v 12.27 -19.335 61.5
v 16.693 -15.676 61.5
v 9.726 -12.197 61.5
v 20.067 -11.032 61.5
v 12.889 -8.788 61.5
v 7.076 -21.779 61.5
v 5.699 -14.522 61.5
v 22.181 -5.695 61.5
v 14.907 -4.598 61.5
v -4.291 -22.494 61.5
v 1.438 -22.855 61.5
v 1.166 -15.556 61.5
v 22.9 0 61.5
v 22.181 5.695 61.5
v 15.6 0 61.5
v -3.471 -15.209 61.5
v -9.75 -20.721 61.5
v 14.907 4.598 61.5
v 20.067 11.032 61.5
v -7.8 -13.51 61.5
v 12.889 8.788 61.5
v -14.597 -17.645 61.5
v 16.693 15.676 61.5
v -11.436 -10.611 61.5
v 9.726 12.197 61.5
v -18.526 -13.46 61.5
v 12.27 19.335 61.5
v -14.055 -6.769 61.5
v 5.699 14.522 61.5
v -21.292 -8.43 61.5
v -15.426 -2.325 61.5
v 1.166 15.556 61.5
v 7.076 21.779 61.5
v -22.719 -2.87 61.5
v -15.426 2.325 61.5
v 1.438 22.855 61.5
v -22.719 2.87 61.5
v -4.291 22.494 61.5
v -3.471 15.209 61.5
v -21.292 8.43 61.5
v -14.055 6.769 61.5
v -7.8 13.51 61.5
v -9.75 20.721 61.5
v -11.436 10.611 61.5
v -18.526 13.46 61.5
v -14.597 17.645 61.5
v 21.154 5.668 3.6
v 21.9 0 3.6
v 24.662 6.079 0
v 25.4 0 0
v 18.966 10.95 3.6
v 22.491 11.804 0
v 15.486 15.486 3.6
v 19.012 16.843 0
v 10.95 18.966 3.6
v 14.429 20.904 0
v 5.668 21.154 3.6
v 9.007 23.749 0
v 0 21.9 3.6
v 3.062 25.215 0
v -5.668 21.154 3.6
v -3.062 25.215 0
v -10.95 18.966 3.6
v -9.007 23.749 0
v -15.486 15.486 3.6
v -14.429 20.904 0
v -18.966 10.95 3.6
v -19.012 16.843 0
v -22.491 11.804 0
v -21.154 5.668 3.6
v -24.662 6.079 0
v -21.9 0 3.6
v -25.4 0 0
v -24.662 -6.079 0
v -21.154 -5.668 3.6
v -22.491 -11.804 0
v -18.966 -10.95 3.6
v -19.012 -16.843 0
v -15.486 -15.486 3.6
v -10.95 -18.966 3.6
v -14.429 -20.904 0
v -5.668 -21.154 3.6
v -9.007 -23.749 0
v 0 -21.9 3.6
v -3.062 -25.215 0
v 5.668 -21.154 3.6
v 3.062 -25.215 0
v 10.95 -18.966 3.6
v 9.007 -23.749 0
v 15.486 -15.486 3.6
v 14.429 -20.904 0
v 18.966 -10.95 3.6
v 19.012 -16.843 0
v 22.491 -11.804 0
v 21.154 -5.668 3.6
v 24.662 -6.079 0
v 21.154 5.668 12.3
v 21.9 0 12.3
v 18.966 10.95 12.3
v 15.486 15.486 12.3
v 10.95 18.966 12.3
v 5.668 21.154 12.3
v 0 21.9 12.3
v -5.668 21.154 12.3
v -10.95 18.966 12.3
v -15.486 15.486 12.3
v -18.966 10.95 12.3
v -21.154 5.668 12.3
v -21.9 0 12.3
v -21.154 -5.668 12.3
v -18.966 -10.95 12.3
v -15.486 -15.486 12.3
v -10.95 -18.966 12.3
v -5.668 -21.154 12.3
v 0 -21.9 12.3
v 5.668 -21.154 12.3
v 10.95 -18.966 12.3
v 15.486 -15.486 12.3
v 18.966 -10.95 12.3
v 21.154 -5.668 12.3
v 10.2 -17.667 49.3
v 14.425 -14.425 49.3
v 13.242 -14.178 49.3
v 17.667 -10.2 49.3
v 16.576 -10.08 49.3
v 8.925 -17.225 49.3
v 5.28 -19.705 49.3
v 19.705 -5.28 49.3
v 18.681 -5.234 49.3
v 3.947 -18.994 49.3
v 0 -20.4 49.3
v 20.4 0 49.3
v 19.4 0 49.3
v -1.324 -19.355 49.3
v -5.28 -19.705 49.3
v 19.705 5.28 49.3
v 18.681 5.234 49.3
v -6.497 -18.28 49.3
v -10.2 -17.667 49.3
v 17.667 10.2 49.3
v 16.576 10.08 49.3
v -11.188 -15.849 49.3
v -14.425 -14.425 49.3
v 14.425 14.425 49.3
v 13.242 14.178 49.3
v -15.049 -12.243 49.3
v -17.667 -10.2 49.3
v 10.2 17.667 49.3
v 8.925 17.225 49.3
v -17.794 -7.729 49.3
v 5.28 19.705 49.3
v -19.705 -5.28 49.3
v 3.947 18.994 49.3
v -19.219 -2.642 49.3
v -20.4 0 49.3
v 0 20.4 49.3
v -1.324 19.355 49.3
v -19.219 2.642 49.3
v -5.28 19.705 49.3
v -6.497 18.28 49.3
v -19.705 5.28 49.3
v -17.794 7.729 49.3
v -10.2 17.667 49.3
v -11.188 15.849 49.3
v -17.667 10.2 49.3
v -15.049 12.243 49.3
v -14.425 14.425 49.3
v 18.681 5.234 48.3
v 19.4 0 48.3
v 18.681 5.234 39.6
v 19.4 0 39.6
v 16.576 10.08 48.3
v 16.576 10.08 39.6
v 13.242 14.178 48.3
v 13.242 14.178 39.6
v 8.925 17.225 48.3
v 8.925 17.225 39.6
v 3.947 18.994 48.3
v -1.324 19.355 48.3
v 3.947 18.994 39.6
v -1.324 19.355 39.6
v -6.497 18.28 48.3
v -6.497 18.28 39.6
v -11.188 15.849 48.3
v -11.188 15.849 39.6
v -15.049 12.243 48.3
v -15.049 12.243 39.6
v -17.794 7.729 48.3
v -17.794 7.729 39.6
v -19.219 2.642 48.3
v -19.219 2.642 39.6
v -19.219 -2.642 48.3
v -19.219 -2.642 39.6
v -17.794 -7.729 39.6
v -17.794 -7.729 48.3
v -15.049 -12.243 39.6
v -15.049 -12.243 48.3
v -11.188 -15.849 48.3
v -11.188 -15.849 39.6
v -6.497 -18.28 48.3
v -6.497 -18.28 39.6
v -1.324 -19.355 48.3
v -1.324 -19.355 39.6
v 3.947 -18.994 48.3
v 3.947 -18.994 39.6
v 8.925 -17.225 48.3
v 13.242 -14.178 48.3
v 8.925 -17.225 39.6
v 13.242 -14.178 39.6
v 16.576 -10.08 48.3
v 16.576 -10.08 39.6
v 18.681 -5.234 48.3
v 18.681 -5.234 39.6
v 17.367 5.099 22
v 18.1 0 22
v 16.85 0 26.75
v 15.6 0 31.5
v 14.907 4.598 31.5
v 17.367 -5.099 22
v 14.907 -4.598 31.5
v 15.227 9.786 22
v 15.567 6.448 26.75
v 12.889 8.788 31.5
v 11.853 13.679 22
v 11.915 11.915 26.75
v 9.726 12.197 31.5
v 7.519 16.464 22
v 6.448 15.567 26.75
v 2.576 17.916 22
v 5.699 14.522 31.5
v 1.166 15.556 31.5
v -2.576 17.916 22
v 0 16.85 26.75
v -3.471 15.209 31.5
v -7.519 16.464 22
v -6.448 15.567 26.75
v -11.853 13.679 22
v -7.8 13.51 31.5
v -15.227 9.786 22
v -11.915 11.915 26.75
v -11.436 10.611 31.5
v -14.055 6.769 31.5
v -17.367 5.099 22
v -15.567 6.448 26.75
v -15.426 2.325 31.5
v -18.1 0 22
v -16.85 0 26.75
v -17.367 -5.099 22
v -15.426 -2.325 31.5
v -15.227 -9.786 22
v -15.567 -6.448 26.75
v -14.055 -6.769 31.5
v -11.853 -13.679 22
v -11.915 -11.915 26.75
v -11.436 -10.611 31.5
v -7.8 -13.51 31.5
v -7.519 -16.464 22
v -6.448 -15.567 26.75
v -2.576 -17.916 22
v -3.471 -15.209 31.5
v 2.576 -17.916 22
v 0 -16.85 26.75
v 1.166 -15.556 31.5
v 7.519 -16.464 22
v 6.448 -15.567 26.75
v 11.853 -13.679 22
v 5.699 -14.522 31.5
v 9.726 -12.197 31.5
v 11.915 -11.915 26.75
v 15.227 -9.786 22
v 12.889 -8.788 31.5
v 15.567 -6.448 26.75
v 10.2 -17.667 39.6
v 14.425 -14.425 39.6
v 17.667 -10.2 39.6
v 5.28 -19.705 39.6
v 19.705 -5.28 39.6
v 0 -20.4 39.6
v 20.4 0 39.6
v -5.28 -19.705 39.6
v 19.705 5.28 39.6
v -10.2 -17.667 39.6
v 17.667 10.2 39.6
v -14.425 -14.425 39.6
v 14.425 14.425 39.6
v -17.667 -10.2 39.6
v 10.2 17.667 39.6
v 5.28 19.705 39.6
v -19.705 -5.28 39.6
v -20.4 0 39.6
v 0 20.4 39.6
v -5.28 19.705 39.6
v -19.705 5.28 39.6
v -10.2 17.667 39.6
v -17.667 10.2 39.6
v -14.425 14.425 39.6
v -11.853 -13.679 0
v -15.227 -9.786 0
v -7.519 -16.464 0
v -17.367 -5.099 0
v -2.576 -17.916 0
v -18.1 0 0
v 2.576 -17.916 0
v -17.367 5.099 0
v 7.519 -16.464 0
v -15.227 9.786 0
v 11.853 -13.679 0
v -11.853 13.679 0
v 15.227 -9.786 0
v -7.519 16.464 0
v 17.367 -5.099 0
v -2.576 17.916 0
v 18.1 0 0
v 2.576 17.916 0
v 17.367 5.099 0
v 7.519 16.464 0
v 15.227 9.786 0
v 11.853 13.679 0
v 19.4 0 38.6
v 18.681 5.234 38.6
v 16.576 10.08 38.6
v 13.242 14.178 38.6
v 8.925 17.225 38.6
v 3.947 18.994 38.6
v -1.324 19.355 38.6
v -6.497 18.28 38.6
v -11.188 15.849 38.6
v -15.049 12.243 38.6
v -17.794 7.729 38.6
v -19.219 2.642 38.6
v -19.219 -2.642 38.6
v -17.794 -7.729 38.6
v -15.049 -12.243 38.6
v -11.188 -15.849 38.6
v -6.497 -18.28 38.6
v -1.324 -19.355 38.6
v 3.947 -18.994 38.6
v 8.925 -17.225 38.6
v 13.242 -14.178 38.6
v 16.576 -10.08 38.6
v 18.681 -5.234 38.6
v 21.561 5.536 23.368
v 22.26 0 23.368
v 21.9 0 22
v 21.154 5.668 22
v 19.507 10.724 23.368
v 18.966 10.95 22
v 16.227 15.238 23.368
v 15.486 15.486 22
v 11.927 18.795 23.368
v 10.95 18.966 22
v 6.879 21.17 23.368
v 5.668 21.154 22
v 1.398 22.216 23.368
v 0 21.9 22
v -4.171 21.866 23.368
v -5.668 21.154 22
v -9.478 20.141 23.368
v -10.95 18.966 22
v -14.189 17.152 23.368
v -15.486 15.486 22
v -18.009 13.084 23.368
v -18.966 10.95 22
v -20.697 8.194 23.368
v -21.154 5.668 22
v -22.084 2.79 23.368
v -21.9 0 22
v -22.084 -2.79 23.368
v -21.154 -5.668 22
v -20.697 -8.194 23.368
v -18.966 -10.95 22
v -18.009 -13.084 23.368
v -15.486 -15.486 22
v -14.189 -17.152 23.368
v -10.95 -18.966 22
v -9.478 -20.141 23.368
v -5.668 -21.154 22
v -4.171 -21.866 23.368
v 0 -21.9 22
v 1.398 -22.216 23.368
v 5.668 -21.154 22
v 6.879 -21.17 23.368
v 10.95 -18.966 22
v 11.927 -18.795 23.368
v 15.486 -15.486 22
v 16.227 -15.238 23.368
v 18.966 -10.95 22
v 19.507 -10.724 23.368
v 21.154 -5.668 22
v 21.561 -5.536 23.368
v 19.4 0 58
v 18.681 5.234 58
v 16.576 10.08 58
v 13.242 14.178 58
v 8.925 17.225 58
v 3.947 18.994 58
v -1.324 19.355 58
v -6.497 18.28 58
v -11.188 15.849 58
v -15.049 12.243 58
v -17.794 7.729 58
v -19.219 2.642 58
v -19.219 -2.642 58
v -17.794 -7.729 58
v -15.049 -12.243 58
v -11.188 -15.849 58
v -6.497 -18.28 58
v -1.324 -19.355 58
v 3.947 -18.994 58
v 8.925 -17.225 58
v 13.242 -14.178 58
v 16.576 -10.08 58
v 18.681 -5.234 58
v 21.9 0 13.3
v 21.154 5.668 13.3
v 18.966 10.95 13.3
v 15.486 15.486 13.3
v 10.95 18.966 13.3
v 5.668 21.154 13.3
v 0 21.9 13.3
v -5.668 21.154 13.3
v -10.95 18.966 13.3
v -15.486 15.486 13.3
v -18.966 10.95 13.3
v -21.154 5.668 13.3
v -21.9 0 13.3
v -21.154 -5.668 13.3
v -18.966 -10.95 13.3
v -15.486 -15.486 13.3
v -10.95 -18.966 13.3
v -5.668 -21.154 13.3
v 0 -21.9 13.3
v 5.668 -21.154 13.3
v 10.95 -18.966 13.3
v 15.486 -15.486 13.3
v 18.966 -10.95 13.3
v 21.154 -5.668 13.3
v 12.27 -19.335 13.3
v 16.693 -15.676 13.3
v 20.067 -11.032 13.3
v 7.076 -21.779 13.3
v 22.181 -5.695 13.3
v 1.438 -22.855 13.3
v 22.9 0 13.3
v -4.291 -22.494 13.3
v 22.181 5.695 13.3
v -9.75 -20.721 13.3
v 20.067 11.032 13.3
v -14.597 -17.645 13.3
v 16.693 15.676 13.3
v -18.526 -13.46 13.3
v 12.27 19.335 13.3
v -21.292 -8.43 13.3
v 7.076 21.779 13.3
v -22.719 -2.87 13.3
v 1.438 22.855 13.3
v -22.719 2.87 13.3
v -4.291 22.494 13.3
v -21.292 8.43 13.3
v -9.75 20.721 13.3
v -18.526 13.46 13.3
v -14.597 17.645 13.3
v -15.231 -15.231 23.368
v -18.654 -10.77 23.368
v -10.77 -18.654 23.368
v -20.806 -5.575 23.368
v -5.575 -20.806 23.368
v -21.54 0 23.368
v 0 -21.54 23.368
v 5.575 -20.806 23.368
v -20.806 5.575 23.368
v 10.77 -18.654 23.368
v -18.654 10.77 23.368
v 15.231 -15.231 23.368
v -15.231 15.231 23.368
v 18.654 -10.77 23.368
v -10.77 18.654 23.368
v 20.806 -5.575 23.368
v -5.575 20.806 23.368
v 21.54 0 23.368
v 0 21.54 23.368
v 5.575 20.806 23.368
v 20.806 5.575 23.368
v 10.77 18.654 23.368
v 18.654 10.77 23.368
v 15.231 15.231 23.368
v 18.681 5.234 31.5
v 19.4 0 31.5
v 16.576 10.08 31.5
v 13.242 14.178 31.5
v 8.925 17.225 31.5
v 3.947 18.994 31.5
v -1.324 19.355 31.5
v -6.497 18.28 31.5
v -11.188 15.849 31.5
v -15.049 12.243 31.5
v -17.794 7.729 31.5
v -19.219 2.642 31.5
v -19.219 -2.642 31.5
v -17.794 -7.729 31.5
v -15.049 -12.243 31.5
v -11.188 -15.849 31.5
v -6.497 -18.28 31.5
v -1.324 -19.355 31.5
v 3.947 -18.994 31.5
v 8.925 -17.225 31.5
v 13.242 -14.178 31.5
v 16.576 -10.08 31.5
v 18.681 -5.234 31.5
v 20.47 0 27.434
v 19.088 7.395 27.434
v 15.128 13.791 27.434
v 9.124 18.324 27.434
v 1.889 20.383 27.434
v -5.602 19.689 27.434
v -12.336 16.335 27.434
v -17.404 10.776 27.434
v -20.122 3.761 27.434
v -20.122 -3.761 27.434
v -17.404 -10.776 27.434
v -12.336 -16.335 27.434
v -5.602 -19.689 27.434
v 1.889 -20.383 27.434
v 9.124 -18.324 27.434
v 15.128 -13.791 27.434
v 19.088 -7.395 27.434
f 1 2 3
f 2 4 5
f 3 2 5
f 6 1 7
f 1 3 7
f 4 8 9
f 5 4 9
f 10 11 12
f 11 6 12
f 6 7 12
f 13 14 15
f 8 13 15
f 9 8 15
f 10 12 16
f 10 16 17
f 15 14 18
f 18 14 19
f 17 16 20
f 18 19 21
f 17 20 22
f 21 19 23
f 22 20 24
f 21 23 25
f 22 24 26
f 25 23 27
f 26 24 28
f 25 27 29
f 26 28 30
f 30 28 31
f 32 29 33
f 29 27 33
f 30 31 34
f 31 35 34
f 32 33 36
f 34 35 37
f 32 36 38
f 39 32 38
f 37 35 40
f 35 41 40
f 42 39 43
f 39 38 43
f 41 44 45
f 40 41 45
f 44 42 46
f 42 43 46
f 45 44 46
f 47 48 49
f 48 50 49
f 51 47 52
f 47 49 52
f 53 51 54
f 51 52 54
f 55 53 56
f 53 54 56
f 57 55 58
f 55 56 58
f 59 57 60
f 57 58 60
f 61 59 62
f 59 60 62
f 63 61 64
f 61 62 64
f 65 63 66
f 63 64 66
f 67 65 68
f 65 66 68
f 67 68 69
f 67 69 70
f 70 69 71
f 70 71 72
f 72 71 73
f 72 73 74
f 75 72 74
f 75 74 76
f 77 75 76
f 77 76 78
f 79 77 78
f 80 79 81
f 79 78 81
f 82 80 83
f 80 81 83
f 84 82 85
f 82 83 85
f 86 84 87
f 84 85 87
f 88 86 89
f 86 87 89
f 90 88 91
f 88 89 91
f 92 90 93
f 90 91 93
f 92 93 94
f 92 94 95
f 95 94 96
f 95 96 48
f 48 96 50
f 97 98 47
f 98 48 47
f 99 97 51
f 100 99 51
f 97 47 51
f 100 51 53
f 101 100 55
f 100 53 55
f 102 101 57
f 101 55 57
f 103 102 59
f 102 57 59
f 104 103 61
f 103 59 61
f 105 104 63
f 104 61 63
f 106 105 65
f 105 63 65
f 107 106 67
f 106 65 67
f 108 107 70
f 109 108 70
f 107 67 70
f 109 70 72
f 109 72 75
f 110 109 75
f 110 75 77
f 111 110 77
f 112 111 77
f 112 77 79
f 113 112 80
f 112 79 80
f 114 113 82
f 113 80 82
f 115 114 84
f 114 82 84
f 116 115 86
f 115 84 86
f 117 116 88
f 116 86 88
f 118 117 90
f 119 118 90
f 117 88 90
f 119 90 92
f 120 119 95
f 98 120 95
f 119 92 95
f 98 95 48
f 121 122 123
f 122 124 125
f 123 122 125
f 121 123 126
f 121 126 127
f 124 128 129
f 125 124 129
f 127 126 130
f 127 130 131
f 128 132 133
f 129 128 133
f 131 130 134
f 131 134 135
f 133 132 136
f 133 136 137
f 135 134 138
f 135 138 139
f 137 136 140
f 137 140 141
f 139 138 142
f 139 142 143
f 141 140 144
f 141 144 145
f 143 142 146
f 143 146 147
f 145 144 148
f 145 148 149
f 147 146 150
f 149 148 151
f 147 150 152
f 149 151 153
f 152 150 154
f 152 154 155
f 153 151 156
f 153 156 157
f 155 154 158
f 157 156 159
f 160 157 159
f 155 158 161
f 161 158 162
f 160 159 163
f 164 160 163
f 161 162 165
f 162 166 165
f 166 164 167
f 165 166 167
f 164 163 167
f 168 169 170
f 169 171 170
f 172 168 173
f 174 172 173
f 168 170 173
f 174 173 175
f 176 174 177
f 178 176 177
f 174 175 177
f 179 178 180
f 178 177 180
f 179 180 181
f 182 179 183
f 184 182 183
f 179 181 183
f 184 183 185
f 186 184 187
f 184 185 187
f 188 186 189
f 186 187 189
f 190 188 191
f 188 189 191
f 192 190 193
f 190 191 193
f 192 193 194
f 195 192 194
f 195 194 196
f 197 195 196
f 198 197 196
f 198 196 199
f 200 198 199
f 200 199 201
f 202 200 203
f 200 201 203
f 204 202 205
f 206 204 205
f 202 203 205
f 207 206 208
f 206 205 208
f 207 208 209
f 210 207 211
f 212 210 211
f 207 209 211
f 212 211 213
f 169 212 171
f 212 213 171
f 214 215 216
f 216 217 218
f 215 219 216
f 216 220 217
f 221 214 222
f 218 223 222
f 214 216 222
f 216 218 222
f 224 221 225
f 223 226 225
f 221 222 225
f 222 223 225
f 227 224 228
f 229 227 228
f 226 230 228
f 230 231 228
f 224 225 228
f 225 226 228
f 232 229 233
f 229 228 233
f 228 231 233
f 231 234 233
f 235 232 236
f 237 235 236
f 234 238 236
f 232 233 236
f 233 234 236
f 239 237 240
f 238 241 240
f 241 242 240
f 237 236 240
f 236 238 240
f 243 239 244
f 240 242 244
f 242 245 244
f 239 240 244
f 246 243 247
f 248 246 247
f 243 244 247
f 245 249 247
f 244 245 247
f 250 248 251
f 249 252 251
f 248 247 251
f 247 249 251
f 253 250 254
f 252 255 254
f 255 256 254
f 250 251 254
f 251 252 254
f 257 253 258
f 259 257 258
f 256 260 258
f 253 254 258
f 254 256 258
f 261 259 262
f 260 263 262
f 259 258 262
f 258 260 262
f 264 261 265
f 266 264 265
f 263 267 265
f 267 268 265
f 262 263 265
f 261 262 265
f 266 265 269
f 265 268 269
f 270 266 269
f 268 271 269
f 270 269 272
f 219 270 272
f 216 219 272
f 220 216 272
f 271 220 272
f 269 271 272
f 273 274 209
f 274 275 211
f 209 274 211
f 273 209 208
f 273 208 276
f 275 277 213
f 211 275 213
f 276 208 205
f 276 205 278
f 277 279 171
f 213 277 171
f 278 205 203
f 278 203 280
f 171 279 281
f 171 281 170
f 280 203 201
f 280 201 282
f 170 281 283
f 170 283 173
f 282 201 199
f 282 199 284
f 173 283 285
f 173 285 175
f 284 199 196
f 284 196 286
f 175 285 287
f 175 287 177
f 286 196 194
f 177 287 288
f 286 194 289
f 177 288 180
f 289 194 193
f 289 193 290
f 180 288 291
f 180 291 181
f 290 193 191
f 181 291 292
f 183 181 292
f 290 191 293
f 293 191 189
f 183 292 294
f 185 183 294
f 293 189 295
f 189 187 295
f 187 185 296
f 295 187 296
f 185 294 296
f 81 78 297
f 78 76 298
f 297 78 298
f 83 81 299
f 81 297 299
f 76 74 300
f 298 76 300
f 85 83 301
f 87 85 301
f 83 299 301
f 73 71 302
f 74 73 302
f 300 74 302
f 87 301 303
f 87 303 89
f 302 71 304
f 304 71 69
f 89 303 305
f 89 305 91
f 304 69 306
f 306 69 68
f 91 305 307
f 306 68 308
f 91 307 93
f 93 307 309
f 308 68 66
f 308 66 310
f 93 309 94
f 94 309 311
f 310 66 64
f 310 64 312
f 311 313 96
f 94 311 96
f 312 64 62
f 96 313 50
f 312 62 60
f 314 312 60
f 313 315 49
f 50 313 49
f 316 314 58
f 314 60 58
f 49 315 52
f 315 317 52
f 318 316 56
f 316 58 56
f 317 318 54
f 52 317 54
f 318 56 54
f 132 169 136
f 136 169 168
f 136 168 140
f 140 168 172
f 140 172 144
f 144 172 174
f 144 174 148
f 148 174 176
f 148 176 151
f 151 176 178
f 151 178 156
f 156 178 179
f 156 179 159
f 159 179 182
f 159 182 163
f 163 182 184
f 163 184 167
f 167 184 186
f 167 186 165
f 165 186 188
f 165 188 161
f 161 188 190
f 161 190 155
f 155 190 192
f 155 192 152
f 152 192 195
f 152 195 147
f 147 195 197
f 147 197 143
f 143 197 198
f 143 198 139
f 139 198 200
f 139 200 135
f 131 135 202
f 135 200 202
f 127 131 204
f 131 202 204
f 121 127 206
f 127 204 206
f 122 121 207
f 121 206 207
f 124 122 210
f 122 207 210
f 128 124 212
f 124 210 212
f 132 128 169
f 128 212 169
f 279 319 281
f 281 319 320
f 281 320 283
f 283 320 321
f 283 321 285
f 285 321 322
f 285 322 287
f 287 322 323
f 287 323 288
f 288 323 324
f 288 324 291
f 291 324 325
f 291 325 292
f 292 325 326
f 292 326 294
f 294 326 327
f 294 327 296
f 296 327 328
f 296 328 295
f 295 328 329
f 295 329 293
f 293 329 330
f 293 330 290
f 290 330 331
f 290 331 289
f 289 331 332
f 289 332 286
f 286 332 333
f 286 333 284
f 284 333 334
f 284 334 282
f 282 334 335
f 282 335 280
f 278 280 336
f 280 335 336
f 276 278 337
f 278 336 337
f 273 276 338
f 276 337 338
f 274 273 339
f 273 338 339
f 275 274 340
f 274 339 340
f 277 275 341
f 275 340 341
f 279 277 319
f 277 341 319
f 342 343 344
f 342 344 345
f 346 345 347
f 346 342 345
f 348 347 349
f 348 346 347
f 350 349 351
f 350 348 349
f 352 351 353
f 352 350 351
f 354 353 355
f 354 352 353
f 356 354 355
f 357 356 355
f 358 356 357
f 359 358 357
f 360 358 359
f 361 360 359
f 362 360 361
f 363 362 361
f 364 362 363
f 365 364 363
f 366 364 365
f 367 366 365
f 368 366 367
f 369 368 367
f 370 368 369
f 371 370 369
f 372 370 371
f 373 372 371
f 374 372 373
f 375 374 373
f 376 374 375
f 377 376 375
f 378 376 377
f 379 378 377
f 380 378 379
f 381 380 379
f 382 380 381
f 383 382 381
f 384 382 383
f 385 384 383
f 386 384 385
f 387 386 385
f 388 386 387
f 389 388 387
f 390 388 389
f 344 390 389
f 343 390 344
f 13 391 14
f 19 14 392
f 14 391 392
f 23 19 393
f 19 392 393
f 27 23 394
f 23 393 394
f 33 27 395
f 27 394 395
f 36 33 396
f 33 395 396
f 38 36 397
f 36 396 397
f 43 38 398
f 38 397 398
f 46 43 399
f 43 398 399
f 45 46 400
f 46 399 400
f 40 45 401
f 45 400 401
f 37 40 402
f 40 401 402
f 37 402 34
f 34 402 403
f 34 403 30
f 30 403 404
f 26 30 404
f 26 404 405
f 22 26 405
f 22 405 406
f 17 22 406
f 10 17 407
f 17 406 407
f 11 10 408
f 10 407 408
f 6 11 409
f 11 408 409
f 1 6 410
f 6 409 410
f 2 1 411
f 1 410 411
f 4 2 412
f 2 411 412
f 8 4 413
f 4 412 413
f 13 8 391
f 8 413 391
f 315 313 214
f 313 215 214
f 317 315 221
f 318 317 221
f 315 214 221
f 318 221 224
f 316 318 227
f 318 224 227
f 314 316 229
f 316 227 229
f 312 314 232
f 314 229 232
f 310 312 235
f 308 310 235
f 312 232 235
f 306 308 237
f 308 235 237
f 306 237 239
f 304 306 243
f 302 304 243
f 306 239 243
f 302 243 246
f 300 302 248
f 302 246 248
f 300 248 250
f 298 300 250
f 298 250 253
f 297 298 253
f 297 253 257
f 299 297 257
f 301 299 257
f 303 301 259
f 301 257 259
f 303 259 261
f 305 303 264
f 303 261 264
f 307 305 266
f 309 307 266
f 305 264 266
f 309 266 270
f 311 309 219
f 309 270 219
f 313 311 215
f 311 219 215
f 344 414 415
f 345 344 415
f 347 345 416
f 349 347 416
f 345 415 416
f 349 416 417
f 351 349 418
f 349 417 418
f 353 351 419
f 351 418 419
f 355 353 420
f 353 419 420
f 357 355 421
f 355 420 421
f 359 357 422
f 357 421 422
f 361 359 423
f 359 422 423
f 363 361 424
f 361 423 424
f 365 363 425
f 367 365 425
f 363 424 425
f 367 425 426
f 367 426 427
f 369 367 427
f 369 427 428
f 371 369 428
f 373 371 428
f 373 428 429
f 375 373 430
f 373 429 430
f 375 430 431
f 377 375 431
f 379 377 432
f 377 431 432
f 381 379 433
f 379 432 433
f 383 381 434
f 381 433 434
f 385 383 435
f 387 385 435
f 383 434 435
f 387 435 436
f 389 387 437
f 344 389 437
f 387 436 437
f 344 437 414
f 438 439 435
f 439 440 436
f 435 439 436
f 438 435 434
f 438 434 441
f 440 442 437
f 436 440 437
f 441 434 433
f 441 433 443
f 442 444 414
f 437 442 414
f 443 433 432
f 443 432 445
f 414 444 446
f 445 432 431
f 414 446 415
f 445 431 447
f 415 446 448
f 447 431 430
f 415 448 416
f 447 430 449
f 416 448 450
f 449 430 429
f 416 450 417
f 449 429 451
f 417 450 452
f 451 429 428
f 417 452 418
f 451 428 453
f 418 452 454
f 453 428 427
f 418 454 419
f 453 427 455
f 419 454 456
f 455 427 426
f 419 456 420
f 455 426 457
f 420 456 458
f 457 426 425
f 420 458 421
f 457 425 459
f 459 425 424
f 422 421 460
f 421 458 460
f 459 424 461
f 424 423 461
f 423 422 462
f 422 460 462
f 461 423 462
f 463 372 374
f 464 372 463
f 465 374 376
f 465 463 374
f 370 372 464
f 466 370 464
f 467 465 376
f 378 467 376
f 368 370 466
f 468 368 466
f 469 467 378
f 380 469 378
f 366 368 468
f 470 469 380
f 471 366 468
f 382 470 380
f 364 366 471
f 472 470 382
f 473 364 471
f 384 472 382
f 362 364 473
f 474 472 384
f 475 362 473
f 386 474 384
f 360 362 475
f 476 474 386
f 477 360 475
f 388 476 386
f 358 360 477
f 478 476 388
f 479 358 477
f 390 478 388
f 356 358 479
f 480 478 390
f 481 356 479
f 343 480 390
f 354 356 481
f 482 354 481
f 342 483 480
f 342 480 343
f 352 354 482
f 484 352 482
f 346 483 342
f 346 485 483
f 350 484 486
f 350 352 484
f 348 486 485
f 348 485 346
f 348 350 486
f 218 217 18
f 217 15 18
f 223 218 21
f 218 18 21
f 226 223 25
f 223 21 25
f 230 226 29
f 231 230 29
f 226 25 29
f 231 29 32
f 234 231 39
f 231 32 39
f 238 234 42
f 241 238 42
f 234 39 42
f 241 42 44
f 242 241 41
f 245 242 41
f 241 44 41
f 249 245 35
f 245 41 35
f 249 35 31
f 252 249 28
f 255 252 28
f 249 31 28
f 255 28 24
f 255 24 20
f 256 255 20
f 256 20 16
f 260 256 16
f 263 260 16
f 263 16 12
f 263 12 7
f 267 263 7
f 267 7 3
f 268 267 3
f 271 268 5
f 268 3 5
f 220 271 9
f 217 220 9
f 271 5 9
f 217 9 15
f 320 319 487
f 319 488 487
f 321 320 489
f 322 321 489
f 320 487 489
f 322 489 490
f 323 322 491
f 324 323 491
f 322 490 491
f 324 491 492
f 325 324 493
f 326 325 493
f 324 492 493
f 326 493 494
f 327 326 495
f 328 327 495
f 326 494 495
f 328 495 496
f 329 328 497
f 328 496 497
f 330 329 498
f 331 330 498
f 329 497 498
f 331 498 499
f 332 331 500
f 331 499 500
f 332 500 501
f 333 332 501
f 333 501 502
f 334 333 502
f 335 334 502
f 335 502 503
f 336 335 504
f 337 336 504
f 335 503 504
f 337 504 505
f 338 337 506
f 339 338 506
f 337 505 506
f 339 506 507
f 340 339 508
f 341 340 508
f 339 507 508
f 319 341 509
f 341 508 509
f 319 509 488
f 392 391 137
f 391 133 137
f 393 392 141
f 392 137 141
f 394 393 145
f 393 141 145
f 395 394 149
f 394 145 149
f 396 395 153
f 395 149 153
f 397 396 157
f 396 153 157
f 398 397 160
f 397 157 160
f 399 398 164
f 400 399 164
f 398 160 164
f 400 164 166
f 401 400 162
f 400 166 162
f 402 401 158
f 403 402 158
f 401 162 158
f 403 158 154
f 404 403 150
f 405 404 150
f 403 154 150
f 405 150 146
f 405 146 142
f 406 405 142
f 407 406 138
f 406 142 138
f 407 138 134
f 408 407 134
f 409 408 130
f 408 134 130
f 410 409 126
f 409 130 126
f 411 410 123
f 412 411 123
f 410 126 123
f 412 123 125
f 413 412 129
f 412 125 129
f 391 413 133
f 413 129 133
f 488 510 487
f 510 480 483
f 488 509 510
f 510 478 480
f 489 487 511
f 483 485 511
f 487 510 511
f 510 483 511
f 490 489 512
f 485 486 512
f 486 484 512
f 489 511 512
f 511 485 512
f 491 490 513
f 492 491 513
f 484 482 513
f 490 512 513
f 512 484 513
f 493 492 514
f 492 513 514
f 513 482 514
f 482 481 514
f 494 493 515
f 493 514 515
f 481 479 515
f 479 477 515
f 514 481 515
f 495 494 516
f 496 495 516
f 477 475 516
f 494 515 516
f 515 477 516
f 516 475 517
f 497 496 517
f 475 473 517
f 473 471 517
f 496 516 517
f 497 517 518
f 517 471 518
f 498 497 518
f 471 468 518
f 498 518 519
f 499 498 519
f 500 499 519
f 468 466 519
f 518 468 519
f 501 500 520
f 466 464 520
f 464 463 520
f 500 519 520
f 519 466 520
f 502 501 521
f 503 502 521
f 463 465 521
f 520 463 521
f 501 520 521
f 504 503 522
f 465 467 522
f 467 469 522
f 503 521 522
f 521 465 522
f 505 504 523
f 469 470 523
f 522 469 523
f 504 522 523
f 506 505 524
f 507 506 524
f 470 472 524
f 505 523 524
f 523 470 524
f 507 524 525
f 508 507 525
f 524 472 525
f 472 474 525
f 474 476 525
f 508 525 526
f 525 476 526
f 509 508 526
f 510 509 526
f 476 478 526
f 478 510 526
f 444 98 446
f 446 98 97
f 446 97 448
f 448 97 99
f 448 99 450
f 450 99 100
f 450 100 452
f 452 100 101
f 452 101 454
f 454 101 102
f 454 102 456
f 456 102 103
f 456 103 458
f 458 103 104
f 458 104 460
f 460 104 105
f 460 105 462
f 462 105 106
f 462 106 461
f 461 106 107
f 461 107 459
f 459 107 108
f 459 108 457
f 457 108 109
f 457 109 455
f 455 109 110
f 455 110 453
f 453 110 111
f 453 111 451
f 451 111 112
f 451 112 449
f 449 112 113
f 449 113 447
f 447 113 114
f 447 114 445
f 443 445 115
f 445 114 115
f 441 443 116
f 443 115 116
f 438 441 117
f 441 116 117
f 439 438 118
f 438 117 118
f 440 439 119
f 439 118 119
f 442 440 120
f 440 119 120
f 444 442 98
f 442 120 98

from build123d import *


with BuildPart() as part:
    # Sketch (on XZ_Plane of Origin) → Revolution (revolve)
    with BuildSketch(Plane.XZ):
        Polygon((19.4, 61.5), (19.4, 31.5), (21.9, 22), (21.9, 0), (18.1, 0), (18.1, 22), (15.6, 31.5), (15.6, 61.5), align=None)
    revolve(axis=Axis((0, 0, 0), (0, 0, 1)))

    # Sketch001 (on XZ_Plane of Origin) → Revolution001 (revolve)
    with BuildSketch(Plane.XZ):
        Polygon((19.4, 61.5), (22.9, 61.5), (19.4, 58), align=None)
        Polygon((21.9, 3.6), (25.4, 0), (21.9, 0), align=None)
        Polygon((21.9, 13.3), (22.9, 13.3), (21.9, 12.3), align=None)
        Polygon((21.540092, 23.36765), (21.9, 22), (22.259908, 23.36765), align=None)
        Polygon((19.4, 49.3), (20.4, 49.3), (19.4, 48.3), align=None)
        Polygon((19.4, 39.6), (20.4, 39.6), (19.4, 38.6), align=None)
    revolve(axis=Axis((0, 0, 0), (0, 0, 1)))


solid = part.part
